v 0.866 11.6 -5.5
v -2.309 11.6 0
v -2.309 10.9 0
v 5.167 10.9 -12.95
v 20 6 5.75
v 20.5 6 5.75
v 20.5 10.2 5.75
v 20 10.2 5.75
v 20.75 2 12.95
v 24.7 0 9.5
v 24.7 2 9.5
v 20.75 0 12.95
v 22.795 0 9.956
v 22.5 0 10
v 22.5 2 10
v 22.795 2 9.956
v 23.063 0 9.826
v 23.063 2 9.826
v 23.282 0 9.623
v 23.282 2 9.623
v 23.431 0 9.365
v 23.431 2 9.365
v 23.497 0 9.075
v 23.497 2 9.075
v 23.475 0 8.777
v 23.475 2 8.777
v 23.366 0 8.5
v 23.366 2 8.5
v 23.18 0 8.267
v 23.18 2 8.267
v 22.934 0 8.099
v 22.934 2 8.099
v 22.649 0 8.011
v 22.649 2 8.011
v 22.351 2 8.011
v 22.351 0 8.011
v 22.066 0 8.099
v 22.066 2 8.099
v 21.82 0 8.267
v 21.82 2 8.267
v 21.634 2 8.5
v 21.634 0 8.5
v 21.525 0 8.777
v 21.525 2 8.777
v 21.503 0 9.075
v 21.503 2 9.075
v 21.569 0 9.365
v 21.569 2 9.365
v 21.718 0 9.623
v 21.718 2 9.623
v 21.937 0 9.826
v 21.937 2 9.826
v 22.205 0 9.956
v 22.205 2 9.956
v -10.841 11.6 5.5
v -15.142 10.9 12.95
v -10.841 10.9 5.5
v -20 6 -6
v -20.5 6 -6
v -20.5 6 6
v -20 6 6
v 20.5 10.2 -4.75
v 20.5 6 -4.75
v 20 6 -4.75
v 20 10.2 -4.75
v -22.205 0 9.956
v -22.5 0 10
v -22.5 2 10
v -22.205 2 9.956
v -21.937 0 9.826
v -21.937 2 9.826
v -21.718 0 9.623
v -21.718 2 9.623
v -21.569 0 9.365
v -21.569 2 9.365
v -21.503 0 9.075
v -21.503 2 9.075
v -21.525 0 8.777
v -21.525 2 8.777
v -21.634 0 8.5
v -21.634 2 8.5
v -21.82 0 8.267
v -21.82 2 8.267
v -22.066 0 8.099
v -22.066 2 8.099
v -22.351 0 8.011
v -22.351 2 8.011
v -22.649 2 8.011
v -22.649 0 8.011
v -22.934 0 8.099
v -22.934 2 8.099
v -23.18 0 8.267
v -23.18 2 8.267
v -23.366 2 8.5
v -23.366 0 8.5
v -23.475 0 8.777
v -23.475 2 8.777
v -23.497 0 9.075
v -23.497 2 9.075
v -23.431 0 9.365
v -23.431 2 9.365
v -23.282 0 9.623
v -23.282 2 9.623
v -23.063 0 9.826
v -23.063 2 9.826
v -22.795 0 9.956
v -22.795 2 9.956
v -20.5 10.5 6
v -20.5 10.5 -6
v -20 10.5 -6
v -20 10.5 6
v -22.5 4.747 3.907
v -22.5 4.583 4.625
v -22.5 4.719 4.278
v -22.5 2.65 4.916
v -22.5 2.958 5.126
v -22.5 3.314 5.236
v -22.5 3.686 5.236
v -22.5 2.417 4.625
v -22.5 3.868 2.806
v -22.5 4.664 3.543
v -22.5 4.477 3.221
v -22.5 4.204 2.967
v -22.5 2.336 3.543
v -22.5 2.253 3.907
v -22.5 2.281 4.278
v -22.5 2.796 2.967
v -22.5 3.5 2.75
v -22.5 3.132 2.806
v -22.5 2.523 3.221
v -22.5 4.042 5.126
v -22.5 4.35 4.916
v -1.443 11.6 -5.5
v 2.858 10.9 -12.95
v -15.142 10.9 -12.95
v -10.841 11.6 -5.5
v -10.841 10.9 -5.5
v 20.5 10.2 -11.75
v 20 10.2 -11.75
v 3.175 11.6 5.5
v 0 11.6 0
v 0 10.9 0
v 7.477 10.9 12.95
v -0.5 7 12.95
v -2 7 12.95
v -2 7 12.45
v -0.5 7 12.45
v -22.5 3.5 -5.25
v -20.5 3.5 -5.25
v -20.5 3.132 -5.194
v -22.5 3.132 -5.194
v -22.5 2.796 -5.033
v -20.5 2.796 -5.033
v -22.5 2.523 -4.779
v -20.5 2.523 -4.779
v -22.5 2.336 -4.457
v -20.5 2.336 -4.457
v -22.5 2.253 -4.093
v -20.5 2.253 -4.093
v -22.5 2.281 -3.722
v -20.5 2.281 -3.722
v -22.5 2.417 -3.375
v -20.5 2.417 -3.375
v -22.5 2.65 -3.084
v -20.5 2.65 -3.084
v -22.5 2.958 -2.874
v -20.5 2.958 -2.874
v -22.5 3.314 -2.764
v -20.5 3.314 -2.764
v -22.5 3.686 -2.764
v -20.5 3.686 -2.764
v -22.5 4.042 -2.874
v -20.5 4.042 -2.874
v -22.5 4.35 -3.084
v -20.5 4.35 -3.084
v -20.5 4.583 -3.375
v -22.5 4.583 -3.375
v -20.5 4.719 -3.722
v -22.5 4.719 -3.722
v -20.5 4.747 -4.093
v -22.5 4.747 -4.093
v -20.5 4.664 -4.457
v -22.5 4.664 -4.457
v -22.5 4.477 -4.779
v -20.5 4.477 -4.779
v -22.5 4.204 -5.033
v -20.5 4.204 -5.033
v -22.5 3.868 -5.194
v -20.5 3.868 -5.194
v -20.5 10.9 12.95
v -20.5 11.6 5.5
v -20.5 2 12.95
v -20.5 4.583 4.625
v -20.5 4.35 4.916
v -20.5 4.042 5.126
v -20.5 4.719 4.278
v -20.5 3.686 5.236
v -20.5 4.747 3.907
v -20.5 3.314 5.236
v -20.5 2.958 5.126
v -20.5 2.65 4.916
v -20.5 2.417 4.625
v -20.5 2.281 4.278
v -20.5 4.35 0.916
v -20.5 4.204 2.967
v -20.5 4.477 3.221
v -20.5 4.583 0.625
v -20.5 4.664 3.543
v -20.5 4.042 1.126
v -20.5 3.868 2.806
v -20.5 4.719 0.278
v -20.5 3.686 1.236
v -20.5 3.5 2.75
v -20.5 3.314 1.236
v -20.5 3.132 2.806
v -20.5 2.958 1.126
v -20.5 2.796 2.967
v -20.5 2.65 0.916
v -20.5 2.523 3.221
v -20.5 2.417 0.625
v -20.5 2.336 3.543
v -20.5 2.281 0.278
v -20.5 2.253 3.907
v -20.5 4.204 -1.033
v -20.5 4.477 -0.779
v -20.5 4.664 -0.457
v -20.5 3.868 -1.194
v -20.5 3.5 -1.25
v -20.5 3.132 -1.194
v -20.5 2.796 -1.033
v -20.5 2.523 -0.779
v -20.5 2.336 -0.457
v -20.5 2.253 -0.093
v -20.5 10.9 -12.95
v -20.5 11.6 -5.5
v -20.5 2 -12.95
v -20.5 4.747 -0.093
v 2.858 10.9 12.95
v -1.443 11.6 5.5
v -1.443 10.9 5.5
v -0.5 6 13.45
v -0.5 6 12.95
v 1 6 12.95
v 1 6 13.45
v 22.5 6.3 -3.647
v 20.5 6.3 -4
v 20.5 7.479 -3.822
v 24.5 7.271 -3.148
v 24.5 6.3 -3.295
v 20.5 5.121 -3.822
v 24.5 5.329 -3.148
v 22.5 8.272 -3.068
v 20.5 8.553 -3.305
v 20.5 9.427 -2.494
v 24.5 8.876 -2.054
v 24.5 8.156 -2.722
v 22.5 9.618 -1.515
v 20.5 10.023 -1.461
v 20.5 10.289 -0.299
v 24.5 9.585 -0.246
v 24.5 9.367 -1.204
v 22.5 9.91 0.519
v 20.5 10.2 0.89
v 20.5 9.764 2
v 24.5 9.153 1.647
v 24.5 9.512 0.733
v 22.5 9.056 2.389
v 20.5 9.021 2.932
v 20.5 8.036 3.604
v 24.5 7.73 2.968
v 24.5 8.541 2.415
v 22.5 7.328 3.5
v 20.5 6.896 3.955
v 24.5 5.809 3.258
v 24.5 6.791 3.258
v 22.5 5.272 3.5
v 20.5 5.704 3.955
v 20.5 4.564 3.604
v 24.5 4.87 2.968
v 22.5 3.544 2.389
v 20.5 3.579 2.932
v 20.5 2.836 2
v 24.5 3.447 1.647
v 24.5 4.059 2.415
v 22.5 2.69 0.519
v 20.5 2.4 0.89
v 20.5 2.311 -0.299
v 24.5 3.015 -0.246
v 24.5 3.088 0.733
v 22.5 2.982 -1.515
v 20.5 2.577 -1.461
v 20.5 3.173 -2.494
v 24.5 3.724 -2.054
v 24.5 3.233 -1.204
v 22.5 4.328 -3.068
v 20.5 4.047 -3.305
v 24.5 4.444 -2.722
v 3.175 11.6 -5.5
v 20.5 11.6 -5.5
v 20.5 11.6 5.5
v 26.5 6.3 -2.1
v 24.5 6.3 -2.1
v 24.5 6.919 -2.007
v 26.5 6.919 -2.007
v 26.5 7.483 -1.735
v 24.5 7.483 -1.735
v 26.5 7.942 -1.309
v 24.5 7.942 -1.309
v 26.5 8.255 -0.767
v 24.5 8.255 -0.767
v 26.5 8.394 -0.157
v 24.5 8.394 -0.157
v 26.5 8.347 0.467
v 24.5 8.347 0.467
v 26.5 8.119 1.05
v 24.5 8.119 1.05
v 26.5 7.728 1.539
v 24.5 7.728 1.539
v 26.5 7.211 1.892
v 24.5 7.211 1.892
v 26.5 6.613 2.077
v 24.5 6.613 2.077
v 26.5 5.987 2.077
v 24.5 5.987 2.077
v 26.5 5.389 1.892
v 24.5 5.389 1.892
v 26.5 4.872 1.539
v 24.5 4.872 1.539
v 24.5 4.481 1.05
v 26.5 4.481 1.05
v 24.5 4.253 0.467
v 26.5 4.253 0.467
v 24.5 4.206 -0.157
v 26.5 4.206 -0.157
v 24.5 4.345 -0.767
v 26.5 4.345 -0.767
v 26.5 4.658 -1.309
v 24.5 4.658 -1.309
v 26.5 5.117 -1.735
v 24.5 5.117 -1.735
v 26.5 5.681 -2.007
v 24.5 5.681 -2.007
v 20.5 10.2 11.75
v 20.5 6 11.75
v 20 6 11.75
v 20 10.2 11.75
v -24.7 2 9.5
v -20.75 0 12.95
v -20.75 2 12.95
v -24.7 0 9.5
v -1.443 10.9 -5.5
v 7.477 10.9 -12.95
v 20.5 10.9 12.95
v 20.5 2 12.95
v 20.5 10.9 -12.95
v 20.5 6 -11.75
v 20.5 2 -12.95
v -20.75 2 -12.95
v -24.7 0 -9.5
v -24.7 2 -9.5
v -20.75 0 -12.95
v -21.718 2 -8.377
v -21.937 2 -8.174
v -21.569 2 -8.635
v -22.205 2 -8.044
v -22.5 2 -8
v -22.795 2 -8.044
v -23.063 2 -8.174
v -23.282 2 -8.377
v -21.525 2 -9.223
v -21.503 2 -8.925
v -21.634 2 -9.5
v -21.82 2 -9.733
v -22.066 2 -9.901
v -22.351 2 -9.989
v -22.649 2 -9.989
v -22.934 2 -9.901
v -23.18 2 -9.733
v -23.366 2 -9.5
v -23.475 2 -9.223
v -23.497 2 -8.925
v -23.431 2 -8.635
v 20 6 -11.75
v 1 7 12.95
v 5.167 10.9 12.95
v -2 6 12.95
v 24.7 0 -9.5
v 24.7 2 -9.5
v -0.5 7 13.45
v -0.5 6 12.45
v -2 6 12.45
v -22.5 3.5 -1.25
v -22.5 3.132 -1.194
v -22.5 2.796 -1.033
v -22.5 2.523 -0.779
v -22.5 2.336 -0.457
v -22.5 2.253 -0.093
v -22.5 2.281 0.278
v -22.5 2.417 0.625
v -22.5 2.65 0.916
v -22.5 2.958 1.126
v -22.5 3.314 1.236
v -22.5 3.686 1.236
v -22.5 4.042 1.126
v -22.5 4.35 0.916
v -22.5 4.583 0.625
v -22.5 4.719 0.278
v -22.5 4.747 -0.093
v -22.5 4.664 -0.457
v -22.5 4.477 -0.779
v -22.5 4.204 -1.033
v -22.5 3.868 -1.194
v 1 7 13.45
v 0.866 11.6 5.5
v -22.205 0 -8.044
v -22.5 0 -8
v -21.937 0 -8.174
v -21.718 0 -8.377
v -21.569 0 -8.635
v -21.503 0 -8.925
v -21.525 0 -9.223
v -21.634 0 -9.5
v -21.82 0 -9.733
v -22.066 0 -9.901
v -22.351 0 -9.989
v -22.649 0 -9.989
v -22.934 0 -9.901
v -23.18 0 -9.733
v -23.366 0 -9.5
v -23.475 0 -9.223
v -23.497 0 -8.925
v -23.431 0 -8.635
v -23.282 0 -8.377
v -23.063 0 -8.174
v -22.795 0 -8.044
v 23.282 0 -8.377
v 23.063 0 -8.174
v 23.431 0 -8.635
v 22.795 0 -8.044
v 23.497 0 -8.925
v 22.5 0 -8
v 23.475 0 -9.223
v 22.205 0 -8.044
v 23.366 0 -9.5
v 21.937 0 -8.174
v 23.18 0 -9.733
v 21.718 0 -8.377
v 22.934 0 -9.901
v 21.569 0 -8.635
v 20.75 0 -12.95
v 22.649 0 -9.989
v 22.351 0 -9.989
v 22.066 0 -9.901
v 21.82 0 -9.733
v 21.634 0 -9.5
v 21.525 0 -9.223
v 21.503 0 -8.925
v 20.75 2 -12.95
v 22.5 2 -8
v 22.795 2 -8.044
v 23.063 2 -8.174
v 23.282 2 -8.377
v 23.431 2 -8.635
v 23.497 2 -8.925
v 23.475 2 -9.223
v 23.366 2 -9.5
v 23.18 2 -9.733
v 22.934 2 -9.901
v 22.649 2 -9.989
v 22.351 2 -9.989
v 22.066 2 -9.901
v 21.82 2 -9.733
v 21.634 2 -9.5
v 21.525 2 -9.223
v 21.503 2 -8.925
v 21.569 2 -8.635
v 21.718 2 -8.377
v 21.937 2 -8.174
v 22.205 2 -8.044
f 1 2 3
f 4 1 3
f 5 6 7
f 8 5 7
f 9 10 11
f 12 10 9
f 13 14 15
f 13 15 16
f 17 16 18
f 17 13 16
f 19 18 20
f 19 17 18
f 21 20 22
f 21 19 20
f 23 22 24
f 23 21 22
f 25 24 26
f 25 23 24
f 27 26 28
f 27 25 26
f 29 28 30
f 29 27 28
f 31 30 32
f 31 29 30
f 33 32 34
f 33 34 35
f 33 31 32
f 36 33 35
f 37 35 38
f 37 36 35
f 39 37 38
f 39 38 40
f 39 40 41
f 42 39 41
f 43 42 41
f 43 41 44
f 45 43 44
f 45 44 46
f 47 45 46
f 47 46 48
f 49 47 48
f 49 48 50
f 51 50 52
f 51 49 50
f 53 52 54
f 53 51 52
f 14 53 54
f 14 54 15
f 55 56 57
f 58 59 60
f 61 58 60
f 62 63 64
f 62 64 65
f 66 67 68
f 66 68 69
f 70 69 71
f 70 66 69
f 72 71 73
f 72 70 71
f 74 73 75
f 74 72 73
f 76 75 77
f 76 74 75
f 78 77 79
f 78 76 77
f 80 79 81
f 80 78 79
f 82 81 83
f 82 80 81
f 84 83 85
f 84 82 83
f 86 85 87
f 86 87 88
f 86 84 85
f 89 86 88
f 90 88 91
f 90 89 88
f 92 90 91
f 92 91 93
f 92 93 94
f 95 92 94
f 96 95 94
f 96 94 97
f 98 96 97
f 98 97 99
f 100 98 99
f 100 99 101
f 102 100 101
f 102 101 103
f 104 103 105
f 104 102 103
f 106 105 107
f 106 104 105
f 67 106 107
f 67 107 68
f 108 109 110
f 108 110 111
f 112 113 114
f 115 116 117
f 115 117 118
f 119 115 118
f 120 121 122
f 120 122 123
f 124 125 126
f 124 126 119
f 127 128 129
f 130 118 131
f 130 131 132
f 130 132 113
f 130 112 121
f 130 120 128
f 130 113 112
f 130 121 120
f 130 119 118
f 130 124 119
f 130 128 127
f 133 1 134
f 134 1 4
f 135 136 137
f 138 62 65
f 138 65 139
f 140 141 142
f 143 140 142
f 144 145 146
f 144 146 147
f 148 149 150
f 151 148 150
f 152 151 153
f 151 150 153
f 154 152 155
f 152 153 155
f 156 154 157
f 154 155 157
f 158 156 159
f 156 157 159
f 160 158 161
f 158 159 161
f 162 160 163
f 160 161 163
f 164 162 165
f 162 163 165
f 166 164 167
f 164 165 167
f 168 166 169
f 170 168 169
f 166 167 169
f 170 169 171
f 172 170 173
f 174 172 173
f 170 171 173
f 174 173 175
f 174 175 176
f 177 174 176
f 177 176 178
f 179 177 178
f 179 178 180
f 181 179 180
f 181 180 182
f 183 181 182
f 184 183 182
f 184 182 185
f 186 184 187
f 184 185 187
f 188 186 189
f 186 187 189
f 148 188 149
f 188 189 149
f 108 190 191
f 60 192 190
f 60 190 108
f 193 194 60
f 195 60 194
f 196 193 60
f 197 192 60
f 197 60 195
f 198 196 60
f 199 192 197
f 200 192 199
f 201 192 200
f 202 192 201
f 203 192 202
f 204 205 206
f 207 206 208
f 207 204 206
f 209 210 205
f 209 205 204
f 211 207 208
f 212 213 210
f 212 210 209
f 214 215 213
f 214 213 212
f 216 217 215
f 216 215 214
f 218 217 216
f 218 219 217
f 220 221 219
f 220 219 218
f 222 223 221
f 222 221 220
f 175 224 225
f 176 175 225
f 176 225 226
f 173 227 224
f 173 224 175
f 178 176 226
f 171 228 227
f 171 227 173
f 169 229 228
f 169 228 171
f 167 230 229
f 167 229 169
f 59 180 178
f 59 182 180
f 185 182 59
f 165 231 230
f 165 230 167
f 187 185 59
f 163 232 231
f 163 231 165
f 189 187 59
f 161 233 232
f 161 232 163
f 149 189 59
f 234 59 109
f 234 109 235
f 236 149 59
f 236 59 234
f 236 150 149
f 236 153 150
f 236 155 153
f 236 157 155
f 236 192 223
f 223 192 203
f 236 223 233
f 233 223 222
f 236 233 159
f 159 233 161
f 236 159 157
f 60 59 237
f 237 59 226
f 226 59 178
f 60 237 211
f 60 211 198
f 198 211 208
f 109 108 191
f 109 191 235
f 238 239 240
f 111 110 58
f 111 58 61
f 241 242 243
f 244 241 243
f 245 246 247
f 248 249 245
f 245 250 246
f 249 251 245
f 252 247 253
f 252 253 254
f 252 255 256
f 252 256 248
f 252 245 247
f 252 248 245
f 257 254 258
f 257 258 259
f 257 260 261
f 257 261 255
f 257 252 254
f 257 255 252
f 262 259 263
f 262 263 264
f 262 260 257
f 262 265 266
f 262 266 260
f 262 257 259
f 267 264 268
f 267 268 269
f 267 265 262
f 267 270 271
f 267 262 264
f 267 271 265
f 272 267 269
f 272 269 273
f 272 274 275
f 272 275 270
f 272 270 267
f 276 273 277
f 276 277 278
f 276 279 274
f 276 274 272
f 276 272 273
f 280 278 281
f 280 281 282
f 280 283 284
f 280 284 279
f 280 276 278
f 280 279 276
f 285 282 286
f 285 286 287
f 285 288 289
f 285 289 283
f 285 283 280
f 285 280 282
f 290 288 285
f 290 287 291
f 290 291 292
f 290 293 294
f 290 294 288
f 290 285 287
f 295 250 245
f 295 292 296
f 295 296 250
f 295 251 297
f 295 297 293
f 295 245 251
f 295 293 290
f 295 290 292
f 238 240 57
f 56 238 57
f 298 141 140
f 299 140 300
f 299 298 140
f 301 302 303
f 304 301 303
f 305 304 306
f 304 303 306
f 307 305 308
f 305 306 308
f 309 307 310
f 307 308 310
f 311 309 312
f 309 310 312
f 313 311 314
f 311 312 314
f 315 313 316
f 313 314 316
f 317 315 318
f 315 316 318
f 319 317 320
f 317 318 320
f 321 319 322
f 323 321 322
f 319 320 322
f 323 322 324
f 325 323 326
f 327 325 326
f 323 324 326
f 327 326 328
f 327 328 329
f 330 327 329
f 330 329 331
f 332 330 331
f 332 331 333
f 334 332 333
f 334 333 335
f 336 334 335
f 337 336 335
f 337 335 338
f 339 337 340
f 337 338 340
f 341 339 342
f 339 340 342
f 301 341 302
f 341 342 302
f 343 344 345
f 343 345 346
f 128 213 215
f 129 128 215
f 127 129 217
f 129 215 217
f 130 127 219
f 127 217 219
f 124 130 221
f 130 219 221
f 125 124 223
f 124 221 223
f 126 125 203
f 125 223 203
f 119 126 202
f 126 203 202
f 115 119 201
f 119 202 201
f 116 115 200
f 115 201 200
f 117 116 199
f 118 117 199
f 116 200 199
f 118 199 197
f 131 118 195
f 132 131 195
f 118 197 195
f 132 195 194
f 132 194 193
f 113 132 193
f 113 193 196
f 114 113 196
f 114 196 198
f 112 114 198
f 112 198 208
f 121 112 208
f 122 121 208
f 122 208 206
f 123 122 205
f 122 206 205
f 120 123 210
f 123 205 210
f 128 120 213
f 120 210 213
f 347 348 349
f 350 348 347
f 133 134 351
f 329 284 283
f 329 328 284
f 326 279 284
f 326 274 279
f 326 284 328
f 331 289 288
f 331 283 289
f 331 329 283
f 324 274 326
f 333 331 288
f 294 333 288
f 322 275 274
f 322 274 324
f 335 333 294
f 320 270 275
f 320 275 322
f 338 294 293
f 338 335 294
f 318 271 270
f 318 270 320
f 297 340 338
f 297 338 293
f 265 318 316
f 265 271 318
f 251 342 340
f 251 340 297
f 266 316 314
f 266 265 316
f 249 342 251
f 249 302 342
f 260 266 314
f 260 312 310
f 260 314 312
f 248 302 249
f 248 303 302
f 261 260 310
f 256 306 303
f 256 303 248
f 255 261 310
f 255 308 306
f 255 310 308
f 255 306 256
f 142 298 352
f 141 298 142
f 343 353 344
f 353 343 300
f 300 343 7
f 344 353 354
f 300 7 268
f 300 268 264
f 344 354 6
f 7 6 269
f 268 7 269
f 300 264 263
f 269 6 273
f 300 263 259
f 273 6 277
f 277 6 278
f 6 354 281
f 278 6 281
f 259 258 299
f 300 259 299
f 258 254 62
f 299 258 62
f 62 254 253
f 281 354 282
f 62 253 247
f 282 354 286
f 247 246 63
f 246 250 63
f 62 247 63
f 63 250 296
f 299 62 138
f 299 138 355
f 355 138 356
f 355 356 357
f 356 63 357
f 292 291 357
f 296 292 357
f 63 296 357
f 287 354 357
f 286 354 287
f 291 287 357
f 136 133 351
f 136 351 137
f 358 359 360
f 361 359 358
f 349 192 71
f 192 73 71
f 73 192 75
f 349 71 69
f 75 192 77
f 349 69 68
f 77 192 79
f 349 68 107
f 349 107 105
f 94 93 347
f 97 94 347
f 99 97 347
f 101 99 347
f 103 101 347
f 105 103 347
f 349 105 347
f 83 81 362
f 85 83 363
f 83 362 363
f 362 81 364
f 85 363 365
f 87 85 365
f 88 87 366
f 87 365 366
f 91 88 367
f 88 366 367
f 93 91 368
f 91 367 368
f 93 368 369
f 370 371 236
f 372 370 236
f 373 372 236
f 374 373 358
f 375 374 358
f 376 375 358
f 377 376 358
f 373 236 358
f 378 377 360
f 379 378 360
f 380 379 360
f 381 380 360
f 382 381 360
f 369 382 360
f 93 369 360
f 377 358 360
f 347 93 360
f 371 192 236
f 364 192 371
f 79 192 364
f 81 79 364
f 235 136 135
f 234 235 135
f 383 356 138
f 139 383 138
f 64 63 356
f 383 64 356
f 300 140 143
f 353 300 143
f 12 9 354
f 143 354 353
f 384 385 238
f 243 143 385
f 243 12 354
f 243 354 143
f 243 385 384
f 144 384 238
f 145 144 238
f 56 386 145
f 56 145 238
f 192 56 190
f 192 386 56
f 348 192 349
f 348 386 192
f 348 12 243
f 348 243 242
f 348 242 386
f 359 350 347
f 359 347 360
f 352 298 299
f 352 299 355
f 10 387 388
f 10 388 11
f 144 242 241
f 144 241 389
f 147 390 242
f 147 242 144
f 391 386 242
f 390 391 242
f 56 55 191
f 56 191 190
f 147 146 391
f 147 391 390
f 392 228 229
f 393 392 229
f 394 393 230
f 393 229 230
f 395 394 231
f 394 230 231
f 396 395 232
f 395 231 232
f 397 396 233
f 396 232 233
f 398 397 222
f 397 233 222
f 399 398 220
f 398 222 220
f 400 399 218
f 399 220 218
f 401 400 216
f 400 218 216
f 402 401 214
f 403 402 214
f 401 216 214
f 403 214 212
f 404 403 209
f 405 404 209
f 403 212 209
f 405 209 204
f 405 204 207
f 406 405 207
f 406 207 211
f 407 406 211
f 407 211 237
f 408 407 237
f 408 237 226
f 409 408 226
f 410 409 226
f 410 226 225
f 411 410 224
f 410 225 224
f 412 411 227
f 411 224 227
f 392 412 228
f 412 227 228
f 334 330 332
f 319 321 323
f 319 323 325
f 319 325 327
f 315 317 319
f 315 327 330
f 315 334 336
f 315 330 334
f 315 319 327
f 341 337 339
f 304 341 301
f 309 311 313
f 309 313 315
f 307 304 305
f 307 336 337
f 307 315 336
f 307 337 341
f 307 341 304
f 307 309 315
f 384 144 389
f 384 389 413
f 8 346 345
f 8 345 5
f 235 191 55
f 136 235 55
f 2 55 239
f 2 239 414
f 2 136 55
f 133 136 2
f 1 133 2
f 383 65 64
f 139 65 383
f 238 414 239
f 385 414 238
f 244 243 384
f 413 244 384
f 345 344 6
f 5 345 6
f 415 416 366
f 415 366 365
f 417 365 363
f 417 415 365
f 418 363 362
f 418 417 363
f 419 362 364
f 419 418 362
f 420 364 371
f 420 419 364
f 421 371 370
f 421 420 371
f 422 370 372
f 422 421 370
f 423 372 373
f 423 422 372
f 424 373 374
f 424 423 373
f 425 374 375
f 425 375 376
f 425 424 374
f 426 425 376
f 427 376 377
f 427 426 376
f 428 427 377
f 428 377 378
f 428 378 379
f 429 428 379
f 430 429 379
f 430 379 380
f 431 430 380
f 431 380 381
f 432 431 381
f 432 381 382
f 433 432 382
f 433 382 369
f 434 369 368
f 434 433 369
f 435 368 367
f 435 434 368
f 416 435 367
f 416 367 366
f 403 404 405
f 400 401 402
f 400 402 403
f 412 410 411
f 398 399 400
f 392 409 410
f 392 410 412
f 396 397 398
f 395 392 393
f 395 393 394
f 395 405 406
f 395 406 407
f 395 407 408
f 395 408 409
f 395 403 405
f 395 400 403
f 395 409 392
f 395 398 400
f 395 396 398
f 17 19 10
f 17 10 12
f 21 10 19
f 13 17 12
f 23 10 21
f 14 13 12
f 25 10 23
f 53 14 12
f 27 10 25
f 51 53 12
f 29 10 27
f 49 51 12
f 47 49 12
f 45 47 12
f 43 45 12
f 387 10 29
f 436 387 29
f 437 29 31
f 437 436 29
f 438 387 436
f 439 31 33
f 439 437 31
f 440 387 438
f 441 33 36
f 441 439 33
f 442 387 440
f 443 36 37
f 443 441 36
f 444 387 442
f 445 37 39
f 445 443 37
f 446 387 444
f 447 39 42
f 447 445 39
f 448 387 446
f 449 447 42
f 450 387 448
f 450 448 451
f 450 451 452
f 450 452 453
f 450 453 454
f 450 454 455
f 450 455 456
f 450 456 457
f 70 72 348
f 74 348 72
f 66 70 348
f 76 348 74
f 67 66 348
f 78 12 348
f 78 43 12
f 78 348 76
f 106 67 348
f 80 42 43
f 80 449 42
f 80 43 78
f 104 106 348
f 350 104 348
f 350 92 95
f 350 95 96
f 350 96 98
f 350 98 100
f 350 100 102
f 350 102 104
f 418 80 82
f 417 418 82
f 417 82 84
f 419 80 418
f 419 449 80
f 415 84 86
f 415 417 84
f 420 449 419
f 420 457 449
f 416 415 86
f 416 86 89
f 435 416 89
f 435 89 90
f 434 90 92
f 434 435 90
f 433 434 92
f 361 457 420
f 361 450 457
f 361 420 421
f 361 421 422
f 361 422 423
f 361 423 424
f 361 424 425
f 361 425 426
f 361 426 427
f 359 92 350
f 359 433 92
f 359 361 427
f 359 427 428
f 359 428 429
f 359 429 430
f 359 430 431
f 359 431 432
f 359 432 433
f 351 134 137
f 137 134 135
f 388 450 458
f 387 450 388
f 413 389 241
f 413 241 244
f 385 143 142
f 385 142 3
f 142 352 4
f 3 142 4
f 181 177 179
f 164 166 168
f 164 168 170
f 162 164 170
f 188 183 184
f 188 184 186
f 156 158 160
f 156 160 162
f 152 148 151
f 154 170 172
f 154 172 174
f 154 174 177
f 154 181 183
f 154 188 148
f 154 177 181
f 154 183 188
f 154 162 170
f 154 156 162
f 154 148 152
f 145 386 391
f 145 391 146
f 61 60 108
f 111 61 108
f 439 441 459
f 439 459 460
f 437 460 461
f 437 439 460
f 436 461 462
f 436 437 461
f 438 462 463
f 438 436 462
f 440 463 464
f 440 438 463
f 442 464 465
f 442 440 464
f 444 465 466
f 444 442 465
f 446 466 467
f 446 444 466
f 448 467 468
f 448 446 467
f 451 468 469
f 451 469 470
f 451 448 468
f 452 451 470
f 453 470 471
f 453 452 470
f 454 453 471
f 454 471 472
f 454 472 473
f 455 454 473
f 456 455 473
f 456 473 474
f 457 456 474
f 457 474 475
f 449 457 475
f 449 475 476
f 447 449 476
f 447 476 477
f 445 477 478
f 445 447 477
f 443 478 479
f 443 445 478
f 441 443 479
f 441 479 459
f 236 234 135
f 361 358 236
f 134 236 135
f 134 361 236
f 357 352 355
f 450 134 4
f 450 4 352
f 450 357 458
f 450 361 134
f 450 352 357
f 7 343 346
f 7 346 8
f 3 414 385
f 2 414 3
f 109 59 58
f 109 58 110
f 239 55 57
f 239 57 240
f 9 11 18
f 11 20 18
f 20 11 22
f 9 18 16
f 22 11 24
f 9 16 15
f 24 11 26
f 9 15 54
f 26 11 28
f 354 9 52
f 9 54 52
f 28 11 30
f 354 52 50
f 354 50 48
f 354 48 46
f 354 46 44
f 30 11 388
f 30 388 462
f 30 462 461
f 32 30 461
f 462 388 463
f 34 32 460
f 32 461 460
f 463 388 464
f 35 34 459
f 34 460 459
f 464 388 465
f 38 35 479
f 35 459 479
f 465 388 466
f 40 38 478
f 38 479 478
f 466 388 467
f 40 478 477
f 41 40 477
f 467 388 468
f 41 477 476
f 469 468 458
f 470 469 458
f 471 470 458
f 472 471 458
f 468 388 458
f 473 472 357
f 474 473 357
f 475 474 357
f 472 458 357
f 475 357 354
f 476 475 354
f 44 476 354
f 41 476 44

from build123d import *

# Parameters (mm, degrees)
SKETCH_1_R          = 1
EXTRUDE_1_DEPTH     = 2
SKETCH_2_W          = 41
SKETCH_2_H          = 25.9
EXTRUDE_2_DEPTH     = 9.6
CUT_EXTRUDE_1_DEPTH = 49.428323324
CUT_EXTRUDE_2_DEPTH = 0.7
SKETCH_5_R          = 1.25
EXTRUDE_3_DEPTH     = 2
SKETCH_6_R          = 4
EXTRUDE_4_DEPTH     = 4
EXTRUDE_4_TAPER     = 10
SKETCH_7_R          = 2.1
EXTRUDE_5_DEPTH     = 2
SKETCH_8_W          = 12
SKETCH_8_H          = 4.5
CUT_EXTRUDE_3_DEPTH = 0.5
SKETCH_9_W          = 7
SKETCH_9_H          = 4.2
SKETCH_9_W_2        = 6
CUT_EXTRUDE_4_DEPTH = 0.5
SKETCH_12_W         = 3
SKETCH_12_H         = 1
CUT_EXTRUDE_5_DEPTH = 0.5
SKETCH_13_W         = 1.5
SKETCH_13_H         = 1
EXTRUDE_6_DEPTH     = 1


with BuildPart() as part:
    # 草图1 → 凸台-拉伸1 (new body)
    with BuildSketch(Plane(origin=(0, 0, 0), x_dir=(1, 0, 0), z_dir=(0, 1, 0))):
        Polygon((-20.75, 12.95), (20.75, 12.95), (24.7, 9.5), (24.7, -9.5), (20.75, -12.95), (-20.75, -12.95), (-24.7, -9.5), (-24.7, 9.5), align=None)
        with Locations(Location((22.5, 9, 0), (0, 0, 270))):
            Circle(SKETCH_1_R, mode=Mode.SUBTRACT)
        with Locations(Location((22.5, -9, 0), (0, 0, 270))):
            Circle(SKETCH_1_R, mode=Mode.SUBTRACT)
        with Locations(Location((-22.5, -9, 0), (0, 0, 270))):
            Circle(SKETCH_1_R, mode=Mode.SUBTRACT)
        with Locations(Location((-22.5, 9, 0), (0, 0, 270))):
            Circle(SKETCH_1_R, mode=Mode.SUBTRACT)
    extrude(amount=EXTRUDE_1_DEPTH)

    # 草图2 → 凸台-拉伸2 (add)
    with BuildSketch(Plane(origin=(0, 2, 0), x_dir=(1, 0, 0), z_dir=(0, 1, 0))):
        Rectangle(SKETCH_2_W, SKETCH_2_H)
    extrude(amount=EXTRUDE_2_DEPTH)

    # 草图3 → 切除-拉伸1 (cut, through all)
    with BuildSketch(Plane(origin=(20.5, 0, 0), x_dir=(0, 0, -1), z_dir=(1, 0, 0))):
        Polygon((-5.5, 11.6), (-12.95, 10.9), (-12.95, 11.6), align=None)
        Polygon((12.95, 11.6), (5.5, 11.6), (12.95, 10.9), align=None)
    extrude(amount=-CUT_EXTRUDE_1_DEPTH, mode=Mode.SUBTRACT)

    # 草图4 → 切除-拉伸2 (cut)
    with BuildSketch(Plane(origin=(0, 11.6, 0), x_dir=(1, 0, 0), z_dir=(0, 1, 0))):
        Polygon((7.476685986, 12.95), (0, 0), (7.476685986, -12.95), (5.167284909, -12.95), (-2.309401077, 0), (5.167284909, 12.95), align=None)
        Polygon((2.857883832, 12.95), (-1.443375673, 5.5), (-10.840856662, 5.5), (-15.142116168, 12.95), align=None)
        Polygon((-1.443375673, -5.5), (2.857883832, -12.95), (-15.142116168, -12.95), (-10.840856662, -5.5), align=None)
    extrude(amount=-CUT_EXTRUDE_2_DEPTH, mode=Mode.SUBTRACT)

    # 草图5 → 凸台-拉伸3 (add)
    with BuildSketch(Plane.ZY.offset(20.5)):
        with Locations(Location((0, 3.5, 0), (0, 0, 180))):
            Circle(SKETCH_5_R)
        with Locations(Location((4, 3.5, 0), (0, 0, 180))):
            Circle(SKETCH_5_R)
        with Locations(Location((-4, 3.5, 0), (0, 0, 180))):
            Circle(SKETCH_5_R)
    extrude(amount=EXTRUDE_3_DEPTH)

    # 草图6 → 凸台-拉伸4 (add)
    with BuildSketch(Plane(origin=(20.5, 0, 0), x_dir=(0, 0, -1), z_dir=(1, 0, 0))):
        with Locations((0, 6.3)):
            Circle(SKETCH_6_R)
    extrude(amount=EXTRUDE_4_DEPTH, taper=EXTRUDE_4_TAPER)

    # 草图7 → 凸台-拉伸5 (add)
    with BuildSketch(Plane(origin=(24.5, 0, 0), x_dir=(0, 0, -1), z_dir=(1, 0, 0))):
        with Locations((0, 6.3)):
            Circle(SKETCH_7_R)
    extrude(amount=EXTRUDE_5_DEPTH)

    # 草图8 → 切除-拉伸3 (cut)
    with BuildSketch(Plane.ZY.offset(20.5)):
        with Locations((0, 8.25)):
            Rectangle(SKETCH_8_W, SKETCH_8_H)
    extrude(amount=-CUT_EXTRUDE_3_DEPTH, mode=Mode.SUBTRACT)

    # 草图9 → 切除-拉伸4 (cut)
    with BuildSketch(Plane(origin=(20.5, 0, 0), x_dir=(0, 0, -1), z_dir=(1, 0, 0))):
        with Locations((8.25, 8.1)):
            Rectangle(SKETCH_9_W, SKETCH_9_H)
        with Locations((-8.75, 8.1)):
            Rectangle(SKETCH_9_W_2, SKETCH_9_H)
    extrude(amount=-CUT_EXTRUDE_4_DEPTH, mode=Mode.SUBTRACT)

    # 草图12 → 切除-拉伸5 (cut)
    with BuildSketch(Plane.XY.offset(12.95)):
        with Locations((-0.5, 6.5)):
            Rectangle(SKETCH_12_W, SKETCH_12_H)
    extrude(amount=-CUT_EXTRUDE_5_DEPTH, mode=Mode.SUBTRACT)

    # 草图13 → 凸台-拉伸6 (add)
    with BuildSketch(Plane.XY.offset(12.45)):
        with Locations((0.25, 6.5)):
            Rectangle(SKETCH_13_W, SKETCH_13_H)
    extrude(amount=EXTRUDE_6_DEPTH)


solid = part.part
